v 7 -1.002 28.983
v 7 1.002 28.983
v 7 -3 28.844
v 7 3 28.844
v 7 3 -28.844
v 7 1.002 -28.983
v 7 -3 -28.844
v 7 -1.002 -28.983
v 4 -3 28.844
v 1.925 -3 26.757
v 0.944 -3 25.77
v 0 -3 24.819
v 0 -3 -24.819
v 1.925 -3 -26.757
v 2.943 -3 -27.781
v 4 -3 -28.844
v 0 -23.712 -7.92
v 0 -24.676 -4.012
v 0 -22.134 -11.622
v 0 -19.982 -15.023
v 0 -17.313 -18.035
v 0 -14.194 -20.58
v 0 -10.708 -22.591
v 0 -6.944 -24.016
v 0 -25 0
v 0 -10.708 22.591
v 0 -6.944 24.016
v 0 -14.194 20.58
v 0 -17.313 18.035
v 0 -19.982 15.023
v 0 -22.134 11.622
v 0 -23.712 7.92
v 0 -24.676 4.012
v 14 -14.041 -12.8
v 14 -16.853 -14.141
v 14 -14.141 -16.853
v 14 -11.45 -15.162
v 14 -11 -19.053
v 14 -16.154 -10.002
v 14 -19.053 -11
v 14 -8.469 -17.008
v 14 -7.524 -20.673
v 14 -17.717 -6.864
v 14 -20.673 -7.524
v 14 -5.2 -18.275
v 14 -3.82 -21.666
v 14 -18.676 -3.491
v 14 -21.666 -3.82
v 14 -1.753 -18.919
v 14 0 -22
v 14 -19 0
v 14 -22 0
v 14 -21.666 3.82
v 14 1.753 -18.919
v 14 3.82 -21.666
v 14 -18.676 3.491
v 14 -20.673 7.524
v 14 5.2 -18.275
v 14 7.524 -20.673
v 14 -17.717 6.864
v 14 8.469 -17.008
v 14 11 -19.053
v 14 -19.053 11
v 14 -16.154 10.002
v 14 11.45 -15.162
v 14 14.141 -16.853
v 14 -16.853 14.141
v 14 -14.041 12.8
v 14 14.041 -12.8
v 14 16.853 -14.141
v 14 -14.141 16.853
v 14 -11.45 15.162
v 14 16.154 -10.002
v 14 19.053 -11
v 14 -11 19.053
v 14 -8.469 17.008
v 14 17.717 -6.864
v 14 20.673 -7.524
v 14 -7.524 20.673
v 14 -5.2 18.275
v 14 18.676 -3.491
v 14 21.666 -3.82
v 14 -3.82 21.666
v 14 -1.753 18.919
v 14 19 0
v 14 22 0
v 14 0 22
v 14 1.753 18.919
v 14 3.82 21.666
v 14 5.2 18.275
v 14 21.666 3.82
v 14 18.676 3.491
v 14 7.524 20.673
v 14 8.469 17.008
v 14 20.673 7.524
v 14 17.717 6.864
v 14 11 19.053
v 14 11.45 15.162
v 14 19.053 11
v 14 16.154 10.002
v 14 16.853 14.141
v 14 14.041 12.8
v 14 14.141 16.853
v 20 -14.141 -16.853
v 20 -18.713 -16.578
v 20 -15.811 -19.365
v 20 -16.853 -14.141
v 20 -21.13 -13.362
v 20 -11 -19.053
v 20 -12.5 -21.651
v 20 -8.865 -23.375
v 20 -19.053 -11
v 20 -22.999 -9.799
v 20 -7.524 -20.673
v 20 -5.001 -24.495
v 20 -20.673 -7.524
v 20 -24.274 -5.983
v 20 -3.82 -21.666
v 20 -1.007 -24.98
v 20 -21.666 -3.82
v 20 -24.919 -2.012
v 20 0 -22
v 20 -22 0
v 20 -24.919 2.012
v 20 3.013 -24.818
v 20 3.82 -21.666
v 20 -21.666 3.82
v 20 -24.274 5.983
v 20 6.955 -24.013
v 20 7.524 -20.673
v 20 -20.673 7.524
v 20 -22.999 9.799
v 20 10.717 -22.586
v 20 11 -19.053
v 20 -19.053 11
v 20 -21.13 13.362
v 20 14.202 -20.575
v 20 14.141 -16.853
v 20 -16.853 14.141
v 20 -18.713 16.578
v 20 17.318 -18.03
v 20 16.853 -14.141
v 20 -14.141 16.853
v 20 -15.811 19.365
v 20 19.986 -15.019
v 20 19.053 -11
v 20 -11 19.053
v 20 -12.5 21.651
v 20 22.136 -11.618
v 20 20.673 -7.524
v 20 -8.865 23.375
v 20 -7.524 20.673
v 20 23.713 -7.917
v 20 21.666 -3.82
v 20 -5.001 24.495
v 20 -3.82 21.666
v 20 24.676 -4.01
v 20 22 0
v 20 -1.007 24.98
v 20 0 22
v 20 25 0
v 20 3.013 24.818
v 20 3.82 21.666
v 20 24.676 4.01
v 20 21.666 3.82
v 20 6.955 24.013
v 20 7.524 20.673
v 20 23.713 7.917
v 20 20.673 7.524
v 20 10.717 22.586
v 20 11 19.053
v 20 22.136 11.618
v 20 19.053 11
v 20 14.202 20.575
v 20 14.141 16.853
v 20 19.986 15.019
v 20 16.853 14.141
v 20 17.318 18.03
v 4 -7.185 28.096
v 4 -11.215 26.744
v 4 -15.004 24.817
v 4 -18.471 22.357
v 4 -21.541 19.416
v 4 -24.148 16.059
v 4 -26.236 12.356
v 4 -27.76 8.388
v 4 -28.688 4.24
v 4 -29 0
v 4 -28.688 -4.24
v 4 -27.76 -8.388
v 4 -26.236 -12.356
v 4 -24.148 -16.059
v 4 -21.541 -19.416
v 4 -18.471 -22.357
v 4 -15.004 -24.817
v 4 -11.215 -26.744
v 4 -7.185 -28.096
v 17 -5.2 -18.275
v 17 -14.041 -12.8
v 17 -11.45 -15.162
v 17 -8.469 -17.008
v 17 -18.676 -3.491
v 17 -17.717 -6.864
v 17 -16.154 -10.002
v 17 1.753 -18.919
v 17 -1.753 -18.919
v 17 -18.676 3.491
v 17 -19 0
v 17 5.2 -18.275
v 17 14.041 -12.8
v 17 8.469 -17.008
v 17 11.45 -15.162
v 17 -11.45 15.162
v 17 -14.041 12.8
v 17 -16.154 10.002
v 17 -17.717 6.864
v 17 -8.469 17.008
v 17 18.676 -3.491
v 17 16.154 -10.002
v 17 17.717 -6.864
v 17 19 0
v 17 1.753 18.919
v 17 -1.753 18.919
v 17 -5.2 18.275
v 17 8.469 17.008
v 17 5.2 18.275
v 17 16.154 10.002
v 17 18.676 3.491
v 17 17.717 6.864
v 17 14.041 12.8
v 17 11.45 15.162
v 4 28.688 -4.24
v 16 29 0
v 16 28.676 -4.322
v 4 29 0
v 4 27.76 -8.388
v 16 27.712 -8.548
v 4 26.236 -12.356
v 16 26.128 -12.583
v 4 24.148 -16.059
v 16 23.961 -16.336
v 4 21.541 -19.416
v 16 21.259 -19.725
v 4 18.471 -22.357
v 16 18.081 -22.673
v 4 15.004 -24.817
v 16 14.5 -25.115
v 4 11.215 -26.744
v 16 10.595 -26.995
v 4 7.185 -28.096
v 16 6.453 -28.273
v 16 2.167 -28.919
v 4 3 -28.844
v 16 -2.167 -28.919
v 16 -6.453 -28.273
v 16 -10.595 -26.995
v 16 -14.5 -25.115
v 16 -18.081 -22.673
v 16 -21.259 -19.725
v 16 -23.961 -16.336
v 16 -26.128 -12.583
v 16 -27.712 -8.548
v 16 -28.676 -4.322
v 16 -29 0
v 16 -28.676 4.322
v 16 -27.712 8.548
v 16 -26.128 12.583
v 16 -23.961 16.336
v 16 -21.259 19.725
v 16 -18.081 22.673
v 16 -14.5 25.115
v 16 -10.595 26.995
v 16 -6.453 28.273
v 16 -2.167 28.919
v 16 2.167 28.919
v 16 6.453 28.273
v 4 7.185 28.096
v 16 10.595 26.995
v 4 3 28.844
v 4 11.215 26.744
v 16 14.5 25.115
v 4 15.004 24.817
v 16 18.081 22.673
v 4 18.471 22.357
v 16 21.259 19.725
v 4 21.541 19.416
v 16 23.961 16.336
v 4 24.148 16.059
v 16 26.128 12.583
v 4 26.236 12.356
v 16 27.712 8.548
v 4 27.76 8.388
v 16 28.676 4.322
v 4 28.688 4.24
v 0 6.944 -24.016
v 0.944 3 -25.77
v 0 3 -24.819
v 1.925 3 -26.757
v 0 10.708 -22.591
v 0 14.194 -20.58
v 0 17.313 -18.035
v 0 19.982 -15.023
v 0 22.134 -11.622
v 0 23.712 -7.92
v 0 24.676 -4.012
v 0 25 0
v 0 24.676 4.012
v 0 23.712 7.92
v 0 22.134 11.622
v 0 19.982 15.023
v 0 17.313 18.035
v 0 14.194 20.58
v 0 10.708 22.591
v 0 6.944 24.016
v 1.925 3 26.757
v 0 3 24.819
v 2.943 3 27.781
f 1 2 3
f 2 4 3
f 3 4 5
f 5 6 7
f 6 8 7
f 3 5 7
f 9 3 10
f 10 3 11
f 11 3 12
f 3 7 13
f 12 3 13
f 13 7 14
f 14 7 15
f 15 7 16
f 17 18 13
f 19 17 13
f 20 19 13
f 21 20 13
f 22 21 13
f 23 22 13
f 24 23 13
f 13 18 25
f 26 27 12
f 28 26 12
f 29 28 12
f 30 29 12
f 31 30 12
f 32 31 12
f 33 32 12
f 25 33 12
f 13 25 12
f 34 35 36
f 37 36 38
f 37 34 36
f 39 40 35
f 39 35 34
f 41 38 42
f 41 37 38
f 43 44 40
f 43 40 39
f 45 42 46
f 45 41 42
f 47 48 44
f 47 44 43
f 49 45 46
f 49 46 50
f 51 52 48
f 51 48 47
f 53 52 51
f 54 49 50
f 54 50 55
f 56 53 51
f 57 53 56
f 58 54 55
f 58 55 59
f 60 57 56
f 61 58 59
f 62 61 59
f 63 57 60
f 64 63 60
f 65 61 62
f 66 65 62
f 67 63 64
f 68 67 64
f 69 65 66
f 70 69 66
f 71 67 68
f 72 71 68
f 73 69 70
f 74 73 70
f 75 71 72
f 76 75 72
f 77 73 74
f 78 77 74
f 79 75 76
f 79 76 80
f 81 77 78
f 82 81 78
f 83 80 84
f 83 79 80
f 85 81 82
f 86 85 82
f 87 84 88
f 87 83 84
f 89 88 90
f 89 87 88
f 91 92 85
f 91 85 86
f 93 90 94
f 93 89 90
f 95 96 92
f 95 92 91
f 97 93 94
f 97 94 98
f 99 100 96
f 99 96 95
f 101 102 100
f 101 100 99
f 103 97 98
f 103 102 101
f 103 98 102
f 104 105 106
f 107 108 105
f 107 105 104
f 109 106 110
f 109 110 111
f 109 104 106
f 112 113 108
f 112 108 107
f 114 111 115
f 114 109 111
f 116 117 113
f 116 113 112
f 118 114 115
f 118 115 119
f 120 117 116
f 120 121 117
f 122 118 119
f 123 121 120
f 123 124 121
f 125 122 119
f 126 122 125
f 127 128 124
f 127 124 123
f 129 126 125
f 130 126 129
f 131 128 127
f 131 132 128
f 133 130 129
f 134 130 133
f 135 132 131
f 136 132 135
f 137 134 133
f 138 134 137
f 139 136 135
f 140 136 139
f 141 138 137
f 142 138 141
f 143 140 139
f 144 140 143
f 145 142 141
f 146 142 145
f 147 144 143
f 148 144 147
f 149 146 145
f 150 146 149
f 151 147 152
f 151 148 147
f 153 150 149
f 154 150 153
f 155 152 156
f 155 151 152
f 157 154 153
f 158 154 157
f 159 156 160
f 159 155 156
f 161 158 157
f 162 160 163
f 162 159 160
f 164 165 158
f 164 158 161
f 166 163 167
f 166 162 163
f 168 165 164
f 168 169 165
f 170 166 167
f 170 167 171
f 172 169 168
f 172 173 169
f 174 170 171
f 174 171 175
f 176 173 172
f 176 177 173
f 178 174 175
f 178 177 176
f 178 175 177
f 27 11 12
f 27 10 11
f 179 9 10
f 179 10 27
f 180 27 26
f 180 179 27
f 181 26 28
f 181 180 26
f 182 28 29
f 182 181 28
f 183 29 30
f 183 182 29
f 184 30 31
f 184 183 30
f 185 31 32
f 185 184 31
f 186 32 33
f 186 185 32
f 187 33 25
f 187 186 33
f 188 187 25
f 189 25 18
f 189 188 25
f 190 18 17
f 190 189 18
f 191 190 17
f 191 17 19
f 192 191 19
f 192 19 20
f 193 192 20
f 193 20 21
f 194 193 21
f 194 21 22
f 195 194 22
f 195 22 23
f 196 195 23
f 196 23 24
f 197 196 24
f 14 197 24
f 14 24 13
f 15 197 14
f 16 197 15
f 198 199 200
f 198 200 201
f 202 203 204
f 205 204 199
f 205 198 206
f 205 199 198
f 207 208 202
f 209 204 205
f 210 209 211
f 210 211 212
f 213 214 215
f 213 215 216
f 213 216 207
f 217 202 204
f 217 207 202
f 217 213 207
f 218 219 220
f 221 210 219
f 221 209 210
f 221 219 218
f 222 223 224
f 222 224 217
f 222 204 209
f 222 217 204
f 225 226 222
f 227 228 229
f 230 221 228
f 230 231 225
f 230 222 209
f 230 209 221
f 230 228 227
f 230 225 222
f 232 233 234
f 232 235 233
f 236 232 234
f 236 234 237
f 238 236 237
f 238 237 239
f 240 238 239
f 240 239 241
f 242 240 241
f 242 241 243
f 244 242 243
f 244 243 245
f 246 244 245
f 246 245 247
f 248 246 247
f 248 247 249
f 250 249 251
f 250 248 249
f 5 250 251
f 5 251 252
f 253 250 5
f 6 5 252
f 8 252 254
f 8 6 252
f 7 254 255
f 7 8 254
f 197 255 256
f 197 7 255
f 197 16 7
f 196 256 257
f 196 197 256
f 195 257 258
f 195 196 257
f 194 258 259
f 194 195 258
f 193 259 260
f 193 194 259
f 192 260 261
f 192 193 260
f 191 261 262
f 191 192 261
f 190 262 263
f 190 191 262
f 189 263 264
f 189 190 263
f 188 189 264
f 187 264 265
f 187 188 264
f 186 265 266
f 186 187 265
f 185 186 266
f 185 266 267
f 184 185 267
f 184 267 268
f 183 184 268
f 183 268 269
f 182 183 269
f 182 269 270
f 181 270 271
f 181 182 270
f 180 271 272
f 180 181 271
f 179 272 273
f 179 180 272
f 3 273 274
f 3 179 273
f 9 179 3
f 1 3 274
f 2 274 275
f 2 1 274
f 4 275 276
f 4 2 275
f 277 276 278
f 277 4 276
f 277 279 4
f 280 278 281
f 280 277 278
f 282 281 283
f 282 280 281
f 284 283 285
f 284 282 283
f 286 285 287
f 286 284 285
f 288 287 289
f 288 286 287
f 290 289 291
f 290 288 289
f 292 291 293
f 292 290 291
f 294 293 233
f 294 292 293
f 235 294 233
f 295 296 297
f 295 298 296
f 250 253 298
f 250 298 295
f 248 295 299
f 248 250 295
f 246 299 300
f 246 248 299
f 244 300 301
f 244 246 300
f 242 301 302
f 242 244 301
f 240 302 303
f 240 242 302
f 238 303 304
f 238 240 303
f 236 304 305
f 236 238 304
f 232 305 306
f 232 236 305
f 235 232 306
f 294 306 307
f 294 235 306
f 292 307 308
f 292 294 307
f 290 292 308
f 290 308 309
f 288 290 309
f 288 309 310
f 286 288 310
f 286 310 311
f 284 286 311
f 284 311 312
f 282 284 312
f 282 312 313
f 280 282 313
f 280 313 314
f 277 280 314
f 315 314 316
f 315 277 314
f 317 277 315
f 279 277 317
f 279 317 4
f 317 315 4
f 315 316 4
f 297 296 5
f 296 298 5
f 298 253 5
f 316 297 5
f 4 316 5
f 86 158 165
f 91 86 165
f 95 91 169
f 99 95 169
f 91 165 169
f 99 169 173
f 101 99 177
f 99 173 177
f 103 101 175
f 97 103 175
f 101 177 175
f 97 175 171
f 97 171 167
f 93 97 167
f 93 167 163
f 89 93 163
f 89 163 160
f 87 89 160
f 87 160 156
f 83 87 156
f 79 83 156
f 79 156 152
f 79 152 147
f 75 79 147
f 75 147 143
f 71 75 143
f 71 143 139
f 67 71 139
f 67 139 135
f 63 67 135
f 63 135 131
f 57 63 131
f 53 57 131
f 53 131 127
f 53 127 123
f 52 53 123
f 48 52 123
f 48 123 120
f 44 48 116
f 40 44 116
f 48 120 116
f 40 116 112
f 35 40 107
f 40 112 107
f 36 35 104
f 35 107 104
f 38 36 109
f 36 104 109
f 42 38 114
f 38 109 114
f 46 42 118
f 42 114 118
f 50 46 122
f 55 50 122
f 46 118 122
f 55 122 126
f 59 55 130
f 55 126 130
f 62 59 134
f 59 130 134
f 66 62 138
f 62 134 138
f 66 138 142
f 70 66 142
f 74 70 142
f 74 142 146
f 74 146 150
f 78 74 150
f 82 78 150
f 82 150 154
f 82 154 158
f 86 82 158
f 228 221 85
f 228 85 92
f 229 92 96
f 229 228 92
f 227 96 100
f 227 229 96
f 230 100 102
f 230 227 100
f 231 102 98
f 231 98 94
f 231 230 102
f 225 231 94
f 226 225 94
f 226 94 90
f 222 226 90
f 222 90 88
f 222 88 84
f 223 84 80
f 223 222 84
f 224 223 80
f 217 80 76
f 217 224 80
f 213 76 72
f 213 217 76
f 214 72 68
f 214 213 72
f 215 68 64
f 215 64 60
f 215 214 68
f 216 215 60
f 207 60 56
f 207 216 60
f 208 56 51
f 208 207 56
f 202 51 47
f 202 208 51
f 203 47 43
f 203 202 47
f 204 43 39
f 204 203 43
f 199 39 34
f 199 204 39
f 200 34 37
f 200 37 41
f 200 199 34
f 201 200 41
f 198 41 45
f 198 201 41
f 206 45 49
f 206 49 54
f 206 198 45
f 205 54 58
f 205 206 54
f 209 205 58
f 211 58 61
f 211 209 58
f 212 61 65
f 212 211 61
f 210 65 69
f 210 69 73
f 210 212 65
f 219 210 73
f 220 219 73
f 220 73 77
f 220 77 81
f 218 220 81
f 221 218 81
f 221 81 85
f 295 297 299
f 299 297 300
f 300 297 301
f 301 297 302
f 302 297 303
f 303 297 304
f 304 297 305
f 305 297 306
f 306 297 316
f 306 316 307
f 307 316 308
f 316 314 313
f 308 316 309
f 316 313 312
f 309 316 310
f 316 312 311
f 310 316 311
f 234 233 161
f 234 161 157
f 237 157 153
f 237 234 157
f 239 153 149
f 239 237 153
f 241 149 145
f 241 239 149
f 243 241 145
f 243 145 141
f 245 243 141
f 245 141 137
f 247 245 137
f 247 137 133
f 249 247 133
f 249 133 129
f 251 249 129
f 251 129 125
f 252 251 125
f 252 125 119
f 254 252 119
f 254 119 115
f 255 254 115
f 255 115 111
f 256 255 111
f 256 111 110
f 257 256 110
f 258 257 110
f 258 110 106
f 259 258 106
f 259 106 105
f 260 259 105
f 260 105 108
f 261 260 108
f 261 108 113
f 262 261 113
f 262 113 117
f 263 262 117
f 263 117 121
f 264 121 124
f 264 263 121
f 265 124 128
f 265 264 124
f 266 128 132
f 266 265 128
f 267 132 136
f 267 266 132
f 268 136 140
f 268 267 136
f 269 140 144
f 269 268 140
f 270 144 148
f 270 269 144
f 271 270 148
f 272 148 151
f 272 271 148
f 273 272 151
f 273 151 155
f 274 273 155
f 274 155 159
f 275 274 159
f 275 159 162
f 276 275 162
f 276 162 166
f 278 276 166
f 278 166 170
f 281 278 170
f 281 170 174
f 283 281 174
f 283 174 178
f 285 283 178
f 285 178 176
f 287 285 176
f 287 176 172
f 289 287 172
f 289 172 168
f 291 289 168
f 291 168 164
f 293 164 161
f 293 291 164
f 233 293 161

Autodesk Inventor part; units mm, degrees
ref_plane "YZ Plane" through (0, 0, 0) normal (1, 0, 0) x (0, 1, 0)
ref_plane "XZ Plane" through (0, 0, 0) normal (0, 1, 0) x (-1, 0, 0)
ref_plane "XY Plane" through (0, 0, 0) normal (0, 0, 1) x (1, 0, 0)
sketch "Эскиз1" plane through (0, 0, 0) normal (0, 0, 1) x (1, 0, 0)
  line L0 (0, 0) -> (20, 0)
  line L1 (20, 0) -> (20, 25)
  line L2 (16, 29) -> (4, 29)
  line L3 (0, 25) -> (0, 0)
  line L4 (4, 29) -> (0, 25)
  line L5 (16, 29) -> (20, 25)
  point P0 (20, 29)
  point P1 (0, 29)
  dimension "d14" = 20
  dimension "d15" = 29
  dimension "d16" = 4
  dimension "d17" = 4
  dimension "d18" = 4
  dimension "d19" = 4
revolve "Вращение3" add sketch "Эскиз1" angle 360 about axis through (0, 0, 0) along (1, 0, 0)
sketch "Эскиз3" plane through (0, 0, 0) normal (0, 0, 1) x (1, 0, 0)
  line L0 (20, -25) -> (20, 25) construction
  line L1 (20, 0) -> (20, 22)
  line L2 (14, 22) -> (20, 22)
  line L3 (14, 22) -> (14, 19)
  line L4 (14, 19) -> (17, 19)
  line L5 (17, 19) -> (17, 0)
  line L6 (17, 0) -> (20, 0)
  point P0 (0, 0)
  dimension "d21" = 22
  dimension "d22" = 19
  dimension "d23" = 6
  dimension "d24" = 3
revolve "Вращение4" cut sketch "Эскиз3" angle 360 about axis through (17, 0, 0) along (1, 0, 0)
sketch "Эскиз4" plane through (0, 0, 0) normal (0, 0, 1) x (1, 0, 0)
  line L0 (0, -25) -> (0, 25) construction
  line L1 (0, 3) -> (7, 3)
  line L2 (7, 3) -> (7, -3)
  line L3 (7, -3) -> (0, -3)
  line L4 (0, -3) -> (0, 3)
  point P0 (0, 0)
  point P1 (0, 0)
  point P2 (0, 0)
  dimension "d26" = 7
  dimension "d27" = 6
extrude "Выдавливание1" cut sketch "Эскиз4" along normal through all both and the other way through all
equation "\"d17\" = d16"
equation "\"d18\" = d16"
equation "\"d19\" = d18"
properties part number "711127"
